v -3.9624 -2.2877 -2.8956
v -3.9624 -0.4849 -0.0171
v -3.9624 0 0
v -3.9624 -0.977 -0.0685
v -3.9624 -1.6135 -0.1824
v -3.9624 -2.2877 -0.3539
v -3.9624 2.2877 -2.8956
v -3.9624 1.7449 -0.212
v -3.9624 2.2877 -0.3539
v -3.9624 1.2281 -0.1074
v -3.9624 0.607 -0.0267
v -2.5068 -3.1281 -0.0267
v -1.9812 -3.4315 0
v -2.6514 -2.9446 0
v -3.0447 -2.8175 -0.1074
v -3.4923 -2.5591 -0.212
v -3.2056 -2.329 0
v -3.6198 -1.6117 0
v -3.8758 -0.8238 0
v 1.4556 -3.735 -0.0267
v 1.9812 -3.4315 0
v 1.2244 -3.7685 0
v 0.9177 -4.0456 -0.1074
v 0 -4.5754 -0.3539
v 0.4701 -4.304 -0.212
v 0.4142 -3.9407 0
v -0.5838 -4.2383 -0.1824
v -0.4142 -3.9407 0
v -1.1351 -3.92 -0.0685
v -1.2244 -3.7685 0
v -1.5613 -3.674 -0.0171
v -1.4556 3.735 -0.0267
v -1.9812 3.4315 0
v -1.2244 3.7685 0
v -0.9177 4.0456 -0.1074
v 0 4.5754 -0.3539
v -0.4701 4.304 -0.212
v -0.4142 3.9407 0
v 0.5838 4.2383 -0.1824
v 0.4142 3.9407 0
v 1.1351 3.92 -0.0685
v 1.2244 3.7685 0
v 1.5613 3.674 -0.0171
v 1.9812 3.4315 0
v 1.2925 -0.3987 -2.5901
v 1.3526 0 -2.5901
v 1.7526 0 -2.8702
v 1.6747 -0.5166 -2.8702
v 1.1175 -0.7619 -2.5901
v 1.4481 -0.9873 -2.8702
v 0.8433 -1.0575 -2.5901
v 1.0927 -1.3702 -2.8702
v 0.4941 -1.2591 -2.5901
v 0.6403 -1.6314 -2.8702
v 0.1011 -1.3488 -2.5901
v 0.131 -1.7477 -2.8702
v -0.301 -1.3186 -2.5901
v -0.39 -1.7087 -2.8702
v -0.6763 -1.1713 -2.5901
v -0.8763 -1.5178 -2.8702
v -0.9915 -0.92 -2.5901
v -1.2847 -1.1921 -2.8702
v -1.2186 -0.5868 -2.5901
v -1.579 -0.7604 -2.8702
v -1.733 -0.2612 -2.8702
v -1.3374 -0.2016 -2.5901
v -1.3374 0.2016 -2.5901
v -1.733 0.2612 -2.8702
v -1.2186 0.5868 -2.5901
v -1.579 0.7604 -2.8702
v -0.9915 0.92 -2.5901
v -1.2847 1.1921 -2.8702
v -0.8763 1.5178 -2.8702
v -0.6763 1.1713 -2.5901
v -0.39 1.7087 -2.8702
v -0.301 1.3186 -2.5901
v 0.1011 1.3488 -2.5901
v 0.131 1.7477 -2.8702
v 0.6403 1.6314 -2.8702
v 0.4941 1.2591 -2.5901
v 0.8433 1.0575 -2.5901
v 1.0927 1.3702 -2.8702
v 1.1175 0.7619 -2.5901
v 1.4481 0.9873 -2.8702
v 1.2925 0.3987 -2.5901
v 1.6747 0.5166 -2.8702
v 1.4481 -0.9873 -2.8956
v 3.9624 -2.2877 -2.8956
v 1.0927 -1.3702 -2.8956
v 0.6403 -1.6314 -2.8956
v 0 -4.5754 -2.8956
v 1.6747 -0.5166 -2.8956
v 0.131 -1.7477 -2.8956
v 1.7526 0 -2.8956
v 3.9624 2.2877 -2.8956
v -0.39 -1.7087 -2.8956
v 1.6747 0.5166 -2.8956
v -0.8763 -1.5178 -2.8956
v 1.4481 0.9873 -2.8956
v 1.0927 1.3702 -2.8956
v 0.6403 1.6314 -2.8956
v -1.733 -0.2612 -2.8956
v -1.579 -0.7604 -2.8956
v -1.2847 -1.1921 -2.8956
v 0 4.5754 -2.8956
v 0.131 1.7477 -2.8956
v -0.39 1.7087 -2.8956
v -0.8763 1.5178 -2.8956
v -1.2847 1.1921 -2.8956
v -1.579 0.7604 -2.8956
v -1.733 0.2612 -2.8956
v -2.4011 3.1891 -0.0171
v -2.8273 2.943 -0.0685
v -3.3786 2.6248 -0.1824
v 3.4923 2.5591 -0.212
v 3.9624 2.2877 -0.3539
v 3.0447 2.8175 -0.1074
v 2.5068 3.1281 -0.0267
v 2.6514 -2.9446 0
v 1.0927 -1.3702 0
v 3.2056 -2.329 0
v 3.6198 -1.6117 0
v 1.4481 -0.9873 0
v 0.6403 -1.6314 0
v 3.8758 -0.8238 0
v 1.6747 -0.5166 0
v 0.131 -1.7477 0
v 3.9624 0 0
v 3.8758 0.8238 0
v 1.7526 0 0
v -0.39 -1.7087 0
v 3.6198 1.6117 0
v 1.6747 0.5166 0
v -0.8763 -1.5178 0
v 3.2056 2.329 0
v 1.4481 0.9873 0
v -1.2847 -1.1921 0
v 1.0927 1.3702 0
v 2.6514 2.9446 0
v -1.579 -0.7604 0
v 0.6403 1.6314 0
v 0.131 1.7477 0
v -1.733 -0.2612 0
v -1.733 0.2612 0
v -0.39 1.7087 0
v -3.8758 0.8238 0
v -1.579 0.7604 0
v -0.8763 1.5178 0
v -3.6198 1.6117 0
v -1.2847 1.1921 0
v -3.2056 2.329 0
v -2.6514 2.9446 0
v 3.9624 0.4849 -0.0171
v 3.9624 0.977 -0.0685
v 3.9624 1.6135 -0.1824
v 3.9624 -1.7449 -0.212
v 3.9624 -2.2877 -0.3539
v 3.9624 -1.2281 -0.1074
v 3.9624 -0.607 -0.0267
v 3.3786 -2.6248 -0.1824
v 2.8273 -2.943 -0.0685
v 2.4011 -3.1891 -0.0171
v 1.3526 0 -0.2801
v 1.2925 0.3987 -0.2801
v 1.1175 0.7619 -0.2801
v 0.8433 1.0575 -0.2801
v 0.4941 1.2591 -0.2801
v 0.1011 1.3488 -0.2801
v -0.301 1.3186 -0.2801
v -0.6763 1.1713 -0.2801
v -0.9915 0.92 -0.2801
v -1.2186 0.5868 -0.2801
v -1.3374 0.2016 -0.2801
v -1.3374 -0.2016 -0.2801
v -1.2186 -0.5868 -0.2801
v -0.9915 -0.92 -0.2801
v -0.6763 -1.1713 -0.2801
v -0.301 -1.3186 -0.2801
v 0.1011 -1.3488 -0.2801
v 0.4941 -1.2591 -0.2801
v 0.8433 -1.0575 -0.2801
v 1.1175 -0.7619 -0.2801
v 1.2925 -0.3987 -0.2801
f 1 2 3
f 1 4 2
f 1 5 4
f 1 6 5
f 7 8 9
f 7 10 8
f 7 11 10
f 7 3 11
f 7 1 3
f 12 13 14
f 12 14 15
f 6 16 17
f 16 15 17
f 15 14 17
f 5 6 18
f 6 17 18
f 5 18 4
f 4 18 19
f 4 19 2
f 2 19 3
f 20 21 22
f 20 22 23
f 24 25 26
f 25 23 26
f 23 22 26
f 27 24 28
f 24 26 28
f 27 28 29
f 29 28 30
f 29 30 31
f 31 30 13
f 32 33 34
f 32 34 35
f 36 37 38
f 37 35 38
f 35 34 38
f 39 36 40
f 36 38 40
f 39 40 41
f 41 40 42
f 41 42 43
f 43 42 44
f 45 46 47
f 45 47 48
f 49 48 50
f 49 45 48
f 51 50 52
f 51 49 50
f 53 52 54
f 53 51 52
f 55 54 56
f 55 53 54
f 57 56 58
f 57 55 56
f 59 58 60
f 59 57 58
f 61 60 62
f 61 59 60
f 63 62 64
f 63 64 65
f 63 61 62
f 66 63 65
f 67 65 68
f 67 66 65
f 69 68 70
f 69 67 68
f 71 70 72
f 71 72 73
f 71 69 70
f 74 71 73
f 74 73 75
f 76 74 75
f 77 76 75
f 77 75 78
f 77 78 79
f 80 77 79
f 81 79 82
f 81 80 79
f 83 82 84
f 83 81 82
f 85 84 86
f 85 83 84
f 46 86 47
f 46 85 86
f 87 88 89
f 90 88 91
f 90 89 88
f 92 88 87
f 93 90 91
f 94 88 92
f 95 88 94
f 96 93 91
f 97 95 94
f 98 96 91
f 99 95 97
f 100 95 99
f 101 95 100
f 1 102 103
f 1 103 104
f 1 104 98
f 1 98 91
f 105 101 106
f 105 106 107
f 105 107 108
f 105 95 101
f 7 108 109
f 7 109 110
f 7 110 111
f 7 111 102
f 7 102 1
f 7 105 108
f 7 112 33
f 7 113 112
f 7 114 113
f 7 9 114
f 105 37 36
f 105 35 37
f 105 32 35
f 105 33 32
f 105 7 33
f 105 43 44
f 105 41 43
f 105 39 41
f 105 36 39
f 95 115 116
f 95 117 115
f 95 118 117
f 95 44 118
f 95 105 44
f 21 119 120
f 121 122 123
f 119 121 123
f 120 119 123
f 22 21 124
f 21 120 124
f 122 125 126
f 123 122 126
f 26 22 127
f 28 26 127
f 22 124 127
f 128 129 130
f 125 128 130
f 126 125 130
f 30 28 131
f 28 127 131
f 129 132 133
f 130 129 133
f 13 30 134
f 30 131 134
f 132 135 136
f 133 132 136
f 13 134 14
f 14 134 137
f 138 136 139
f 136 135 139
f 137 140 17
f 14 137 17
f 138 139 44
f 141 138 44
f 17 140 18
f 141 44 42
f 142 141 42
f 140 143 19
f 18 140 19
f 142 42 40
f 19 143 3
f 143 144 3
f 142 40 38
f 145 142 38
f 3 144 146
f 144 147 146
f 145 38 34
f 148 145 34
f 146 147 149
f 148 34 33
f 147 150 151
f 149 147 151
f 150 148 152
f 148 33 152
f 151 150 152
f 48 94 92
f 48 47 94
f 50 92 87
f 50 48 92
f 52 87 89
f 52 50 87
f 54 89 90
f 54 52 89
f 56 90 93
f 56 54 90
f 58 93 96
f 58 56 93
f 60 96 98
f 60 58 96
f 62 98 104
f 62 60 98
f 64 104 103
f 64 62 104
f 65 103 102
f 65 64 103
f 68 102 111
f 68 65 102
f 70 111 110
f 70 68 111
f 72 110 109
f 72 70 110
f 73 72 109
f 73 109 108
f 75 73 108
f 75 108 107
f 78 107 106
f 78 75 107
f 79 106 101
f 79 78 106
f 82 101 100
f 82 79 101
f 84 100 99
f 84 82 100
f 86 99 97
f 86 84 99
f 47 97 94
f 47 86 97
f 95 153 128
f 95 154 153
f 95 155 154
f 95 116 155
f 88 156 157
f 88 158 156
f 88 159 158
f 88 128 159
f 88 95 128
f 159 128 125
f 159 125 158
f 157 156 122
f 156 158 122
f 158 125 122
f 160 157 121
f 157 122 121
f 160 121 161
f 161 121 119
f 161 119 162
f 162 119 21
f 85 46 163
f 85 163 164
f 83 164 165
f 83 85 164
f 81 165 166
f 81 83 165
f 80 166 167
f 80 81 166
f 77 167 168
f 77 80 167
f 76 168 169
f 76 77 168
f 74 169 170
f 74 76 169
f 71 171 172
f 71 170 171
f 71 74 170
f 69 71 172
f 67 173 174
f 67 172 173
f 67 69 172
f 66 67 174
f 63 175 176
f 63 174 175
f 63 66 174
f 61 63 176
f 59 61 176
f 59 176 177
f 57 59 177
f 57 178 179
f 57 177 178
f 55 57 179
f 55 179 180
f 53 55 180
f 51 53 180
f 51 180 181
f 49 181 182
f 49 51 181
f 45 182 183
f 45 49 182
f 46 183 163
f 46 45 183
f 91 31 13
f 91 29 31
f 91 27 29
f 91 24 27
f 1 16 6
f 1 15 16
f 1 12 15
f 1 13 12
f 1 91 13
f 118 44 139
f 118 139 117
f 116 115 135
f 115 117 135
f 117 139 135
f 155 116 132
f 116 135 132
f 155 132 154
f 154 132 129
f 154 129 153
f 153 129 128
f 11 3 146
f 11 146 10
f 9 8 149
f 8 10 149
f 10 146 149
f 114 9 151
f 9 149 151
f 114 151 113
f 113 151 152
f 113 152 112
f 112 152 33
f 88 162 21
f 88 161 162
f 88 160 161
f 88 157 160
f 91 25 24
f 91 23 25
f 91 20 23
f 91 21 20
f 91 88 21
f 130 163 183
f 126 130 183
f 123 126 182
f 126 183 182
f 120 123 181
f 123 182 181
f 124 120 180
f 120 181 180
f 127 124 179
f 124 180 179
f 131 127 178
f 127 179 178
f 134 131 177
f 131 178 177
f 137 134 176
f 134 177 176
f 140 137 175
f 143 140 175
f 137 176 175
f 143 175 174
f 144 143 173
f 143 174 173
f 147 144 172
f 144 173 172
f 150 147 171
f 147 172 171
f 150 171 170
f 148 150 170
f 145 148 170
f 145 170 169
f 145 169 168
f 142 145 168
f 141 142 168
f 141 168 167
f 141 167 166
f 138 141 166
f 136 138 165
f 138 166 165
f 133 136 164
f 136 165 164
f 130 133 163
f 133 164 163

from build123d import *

# Parameters (mm, degrees)
BASENUT_START = -2.8956
BASENUTSKE_R  = 1.35255
BASENUT_DEPTH = 2.8956


with BuildPart() as part:
    # BaseNutSke → BaseNut (new body)
    with BuildSketch(Plane.XY.offset(BASENUT_START)):
        Polygon((3.9624, 2.287692707), (3.9624, -2.287692707), (0, -4.575385413), (-3.9624, -2.287692707), (-3.9624, 2.287692707), (0, 4.575385413), align=None)
        Circle(BASENUTSKE_R, mode=Mode.SUBTRACT)
    extrude(amount=BASENUT_DEPTH)

    # Sketch4 → Single-Chamfer (revolve, cut)
    with BuildSketch(Plane(origin=(0, 0, 0), x_dir=(0, 0, -1), z_dir=(1, 0, 0))):
        Polygon((0, 3.9624), (-12.7, 3.9624), (-12.7, 17.275385413), (0.353907293, 17.275385413), (0.353907293, 4.575385413), align=None)
    revolve(axis=Axis((0, 0, 0), (0, 0, -1)), mode=Mode.SUBTRACT)

    # EndChamferSketch → EndChamfer (revolve, cut)
    with BuildSketch(Plane(origin=(0, 0, 0), x_dir=(0, 0, -1), z_dir=(1, 0, 0)), mode=Mode.PRIVATE) as endchamfer_sk:
        Polygon((2.8702, 1.7526), (2.562070172, 1.312545), (2.921, 1.312545), (2.921, 1.7526), align=None)
        Polygon((-0.0508, 1.7526), (0, 1.7526), (0.308129828, 1.312545), (-0.0508, 1.312545), align=None)
    revolve(endchamfer_sk.sketch.rotate(Axis((0, 0, -25.037505729), (0, 0, -1)), 90), axis=Axis((0, 0, -25.037505729), (0, 0, -1)), mode=Mode.SUBTRACT)


solid = part.part
